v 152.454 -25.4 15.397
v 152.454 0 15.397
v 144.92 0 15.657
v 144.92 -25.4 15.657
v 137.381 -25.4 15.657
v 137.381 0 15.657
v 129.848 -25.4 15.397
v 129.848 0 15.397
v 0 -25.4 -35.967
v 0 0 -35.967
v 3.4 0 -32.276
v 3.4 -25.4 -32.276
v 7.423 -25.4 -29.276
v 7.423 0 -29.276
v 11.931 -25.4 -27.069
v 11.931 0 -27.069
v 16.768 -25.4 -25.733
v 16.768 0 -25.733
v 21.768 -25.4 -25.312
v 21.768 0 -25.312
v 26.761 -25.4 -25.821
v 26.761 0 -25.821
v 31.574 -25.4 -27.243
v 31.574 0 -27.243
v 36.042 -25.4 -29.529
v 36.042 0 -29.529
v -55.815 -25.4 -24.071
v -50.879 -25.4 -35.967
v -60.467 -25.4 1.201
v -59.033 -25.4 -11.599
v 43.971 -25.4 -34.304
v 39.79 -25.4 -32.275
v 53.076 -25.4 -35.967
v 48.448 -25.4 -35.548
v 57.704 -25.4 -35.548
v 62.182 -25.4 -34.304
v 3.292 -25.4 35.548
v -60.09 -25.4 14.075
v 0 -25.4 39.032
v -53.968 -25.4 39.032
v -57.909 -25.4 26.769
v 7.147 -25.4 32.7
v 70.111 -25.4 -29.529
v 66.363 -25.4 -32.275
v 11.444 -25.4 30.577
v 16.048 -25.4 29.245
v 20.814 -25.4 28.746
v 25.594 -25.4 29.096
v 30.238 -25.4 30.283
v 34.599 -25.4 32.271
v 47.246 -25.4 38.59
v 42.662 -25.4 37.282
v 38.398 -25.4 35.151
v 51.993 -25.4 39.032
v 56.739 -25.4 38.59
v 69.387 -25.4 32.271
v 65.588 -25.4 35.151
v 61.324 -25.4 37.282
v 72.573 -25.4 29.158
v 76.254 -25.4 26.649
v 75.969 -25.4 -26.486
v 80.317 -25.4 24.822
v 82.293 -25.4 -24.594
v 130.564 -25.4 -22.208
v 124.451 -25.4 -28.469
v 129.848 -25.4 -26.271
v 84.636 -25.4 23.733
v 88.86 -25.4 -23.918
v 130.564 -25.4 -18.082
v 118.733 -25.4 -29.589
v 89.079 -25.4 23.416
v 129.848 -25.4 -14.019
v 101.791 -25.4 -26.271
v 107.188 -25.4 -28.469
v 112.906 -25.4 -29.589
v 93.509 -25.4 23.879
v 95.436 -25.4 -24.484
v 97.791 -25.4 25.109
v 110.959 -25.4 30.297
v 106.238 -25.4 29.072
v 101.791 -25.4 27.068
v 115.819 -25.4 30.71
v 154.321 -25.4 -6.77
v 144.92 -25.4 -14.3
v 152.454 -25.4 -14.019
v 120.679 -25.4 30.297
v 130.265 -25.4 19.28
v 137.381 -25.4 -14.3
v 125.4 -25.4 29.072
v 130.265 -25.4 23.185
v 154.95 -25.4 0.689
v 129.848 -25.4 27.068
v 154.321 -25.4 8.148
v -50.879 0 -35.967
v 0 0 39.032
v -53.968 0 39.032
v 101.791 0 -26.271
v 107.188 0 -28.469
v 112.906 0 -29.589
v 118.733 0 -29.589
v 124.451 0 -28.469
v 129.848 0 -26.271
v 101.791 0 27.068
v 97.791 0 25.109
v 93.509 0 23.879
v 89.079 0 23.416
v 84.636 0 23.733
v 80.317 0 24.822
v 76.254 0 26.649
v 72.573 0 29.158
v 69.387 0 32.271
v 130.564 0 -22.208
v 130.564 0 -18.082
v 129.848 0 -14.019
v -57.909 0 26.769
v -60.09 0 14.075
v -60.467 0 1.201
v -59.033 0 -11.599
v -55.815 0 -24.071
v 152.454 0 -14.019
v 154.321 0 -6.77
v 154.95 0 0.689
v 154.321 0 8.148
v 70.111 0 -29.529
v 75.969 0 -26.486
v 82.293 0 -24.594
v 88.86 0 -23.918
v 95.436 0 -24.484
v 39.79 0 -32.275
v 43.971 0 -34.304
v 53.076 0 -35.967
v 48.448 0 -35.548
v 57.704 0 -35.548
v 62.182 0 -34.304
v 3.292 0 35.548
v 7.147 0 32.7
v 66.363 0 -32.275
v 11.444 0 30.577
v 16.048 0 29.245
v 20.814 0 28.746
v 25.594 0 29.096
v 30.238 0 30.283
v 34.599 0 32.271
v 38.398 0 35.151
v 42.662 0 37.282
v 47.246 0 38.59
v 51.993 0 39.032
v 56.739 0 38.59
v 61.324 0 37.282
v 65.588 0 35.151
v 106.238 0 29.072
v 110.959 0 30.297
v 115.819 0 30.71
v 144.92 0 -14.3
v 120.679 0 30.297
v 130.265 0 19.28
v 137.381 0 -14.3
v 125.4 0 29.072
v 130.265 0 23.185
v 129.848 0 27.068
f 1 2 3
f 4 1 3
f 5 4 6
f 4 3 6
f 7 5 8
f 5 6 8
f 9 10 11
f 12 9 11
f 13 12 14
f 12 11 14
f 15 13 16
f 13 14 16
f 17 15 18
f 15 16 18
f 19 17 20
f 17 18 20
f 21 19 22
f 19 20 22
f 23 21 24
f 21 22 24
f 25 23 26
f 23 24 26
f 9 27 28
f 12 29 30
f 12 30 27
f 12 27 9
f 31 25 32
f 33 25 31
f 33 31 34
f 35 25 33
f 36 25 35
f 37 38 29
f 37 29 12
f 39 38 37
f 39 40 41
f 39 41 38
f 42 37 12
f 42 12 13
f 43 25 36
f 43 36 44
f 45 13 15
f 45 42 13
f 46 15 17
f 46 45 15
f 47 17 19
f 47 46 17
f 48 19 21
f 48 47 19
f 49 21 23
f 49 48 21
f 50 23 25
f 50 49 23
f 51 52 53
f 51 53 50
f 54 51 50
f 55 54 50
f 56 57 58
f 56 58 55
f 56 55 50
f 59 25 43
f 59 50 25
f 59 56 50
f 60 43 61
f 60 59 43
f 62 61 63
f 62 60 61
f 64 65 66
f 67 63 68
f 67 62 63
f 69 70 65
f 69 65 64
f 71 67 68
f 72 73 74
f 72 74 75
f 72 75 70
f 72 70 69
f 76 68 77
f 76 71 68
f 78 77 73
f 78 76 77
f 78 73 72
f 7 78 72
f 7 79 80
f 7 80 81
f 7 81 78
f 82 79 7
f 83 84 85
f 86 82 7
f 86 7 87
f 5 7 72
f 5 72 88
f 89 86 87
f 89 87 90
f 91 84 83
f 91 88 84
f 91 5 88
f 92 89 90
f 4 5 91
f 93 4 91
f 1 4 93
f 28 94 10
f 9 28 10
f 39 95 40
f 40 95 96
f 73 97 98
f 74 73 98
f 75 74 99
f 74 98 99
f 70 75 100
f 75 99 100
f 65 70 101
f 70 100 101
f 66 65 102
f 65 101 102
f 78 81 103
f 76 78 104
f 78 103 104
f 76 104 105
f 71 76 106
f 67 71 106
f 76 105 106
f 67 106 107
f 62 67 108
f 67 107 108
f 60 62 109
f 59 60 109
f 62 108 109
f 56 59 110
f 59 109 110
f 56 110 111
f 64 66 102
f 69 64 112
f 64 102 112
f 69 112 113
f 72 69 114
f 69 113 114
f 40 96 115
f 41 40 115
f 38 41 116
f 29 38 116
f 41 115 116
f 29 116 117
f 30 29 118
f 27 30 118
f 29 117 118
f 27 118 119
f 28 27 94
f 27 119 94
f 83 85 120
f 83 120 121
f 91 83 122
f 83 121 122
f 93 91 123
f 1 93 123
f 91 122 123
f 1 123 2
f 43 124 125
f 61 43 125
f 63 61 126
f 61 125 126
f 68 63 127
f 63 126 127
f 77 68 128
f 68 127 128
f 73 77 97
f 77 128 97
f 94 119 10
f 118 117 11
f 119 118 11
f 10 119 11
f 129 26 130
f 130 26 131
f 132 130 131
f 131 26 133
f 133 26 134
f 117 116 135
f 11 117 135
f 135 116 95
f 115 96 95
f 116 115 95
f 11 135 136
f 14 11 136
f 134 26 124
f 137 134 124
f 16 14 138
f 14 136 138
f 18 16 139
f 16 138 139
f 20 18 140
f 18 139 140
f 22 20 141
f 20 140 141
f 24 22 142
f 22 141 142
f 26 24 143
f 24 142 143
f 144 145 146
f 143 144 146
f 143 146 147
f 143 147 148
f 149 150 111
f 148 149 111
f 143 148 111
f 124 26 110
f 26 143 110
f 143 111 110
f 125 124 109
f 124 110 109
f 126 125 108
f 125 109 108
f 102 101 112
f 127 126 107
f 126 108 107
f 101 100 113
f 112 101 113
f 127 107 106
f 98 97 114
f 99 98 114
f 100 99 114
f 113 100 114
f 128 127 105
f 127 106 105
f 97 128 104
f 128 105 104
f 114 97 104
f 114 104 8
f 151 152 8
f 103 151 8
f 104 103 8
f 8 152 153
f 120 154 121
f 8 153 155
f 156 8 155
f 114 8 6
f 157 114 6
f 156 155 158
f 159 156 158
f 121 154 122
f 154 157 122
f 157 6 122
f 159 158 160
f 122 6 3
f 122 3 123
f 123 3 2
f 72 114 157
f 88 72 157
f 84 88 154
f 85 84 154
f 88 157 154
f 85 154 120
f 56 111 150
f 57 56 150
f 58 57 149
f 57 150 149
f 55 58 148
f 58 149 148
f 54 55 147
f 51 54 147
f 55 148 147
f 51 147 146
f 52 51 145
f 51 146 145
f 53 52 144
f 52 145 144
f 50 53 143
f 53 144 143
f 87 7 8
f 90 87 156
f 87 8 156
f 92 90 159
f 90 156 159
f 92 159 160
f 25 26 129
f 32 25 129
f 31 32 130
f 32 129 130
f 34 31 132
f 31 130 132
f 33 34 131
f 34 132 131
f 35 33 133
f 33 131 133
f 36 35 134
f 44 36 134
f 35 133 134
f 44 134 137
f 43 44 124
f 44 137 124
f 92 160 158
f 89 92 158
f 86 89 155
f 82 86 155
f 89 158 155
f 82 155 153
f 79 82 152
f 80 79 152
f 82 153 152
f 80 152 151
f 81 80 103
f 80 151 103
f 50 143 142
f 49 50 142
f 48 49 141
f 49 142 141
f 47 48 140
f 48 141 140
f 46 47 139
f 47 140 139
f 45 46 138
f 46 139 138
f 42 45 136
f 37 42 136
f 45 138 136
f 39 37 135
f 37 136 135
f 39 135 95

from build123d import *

# Parameters (mm, degrees)
F1_DEPTH = 25.4


with BuildPart() as f1:
    # F0 (on Front) → F1 (new body)
    with BuildSketch(Plane.XZ):
        with BuildLine():
            ThreePointArc((70.111157, -29.528858), (64.82074, 1.313272), (69.386698, 32.270945))
            ThreePointArc((69.386698, 32.270945), (51.992809, 39.03154), (34.59892, 32.270945))
            ThreePointArc((34.59892, 32.270945), (29.893964, 1.244372), (36.041575, -29.528858))
            ThreePointArc((36.041575, -29.528858), (53.076366, -35.966931), (70.111157, -29.528858))
        make_face()
        with BuildLine():
            ThreePointArc((101.791199, 27.068468), (84.635881, 23.733368), (69.386698, 32.270945))
            ThreePointArc((69.386698, 32.270945), (64.82074, 1.313272), (70.111157, -29.528858))
            ThreePointArc((70.111157, -29.528858), (85.560524, -24.101311), (101.791199, -26.270727))
            ThreePointArc((101.791199, -26.270727), (98.099114, 0.39887), (101.791199, 27.068468))
        make_face()
        with BuildLine():
            ThreePointArc((36.041575, -29.528858), (29.893964, 1.244372), (34.59892, 32.270945))
            ThreePointArc((34.59892, 32.270945), (16.047725, 29.245195), (0, 39.03154))
            Line((0, 39.03154), (-53.967841, 39.03154))
            ThreePointArc((-53.967841, 39.03154), (-60.466973, 1.200982), (-50.878648, -35.966931))
            Line((-50.878648, -35.966931), (0, -35.966931))
            ThreePointArc((0, -35.966931), (16.76772, -25.732983), (36.041575, -29.528858))
        make_face()
        with BuildLine():
            ThreePointArc((129.847508, 27.068468), (115.819353, 30.70991), (101.791199, 27.068468))
            ThreePointArc((101.791199, 27.068468), (98.099114, 0.39887), (101.791199, -26.270727))
            ThreePointArc((101.791199, -26.270727), (115.819353, -29.729842), (129.847508, -26.270727))
            ThreePointArc((129.847508, -26.270727), (130.654455, -20.145006), (129.847508, -14.019285))
            ThreePointArc((129.847508, -14.019285), (128.08968, 0.688918), (129.847508, 15.397122))
            ThreePointArc((129.847508, 15.397122), (130.317745, 21.232795), (129.847508, 27.068468))
        make_face()
        with BuildLine():
            ThreePointArc((152.453851, 15.397122), (141.150679, 15.689305), (129.847508, 15.397122))
            ThreePointArc((129.847508, 15.397122), (128.08968, 0.688918), (129.847508, -14.019285))
            ThreePointArc((129.847508, -14.019285), (141.150679, -14.335005), (152.453851, -14.019285))
            ThreePointArc((152.453851, -14.019285), (154.9497, 0.688918), (152.453851, 15.397122))
        make_face()
    extrude(amount=F1_DEPTH)


solid = f1.part
